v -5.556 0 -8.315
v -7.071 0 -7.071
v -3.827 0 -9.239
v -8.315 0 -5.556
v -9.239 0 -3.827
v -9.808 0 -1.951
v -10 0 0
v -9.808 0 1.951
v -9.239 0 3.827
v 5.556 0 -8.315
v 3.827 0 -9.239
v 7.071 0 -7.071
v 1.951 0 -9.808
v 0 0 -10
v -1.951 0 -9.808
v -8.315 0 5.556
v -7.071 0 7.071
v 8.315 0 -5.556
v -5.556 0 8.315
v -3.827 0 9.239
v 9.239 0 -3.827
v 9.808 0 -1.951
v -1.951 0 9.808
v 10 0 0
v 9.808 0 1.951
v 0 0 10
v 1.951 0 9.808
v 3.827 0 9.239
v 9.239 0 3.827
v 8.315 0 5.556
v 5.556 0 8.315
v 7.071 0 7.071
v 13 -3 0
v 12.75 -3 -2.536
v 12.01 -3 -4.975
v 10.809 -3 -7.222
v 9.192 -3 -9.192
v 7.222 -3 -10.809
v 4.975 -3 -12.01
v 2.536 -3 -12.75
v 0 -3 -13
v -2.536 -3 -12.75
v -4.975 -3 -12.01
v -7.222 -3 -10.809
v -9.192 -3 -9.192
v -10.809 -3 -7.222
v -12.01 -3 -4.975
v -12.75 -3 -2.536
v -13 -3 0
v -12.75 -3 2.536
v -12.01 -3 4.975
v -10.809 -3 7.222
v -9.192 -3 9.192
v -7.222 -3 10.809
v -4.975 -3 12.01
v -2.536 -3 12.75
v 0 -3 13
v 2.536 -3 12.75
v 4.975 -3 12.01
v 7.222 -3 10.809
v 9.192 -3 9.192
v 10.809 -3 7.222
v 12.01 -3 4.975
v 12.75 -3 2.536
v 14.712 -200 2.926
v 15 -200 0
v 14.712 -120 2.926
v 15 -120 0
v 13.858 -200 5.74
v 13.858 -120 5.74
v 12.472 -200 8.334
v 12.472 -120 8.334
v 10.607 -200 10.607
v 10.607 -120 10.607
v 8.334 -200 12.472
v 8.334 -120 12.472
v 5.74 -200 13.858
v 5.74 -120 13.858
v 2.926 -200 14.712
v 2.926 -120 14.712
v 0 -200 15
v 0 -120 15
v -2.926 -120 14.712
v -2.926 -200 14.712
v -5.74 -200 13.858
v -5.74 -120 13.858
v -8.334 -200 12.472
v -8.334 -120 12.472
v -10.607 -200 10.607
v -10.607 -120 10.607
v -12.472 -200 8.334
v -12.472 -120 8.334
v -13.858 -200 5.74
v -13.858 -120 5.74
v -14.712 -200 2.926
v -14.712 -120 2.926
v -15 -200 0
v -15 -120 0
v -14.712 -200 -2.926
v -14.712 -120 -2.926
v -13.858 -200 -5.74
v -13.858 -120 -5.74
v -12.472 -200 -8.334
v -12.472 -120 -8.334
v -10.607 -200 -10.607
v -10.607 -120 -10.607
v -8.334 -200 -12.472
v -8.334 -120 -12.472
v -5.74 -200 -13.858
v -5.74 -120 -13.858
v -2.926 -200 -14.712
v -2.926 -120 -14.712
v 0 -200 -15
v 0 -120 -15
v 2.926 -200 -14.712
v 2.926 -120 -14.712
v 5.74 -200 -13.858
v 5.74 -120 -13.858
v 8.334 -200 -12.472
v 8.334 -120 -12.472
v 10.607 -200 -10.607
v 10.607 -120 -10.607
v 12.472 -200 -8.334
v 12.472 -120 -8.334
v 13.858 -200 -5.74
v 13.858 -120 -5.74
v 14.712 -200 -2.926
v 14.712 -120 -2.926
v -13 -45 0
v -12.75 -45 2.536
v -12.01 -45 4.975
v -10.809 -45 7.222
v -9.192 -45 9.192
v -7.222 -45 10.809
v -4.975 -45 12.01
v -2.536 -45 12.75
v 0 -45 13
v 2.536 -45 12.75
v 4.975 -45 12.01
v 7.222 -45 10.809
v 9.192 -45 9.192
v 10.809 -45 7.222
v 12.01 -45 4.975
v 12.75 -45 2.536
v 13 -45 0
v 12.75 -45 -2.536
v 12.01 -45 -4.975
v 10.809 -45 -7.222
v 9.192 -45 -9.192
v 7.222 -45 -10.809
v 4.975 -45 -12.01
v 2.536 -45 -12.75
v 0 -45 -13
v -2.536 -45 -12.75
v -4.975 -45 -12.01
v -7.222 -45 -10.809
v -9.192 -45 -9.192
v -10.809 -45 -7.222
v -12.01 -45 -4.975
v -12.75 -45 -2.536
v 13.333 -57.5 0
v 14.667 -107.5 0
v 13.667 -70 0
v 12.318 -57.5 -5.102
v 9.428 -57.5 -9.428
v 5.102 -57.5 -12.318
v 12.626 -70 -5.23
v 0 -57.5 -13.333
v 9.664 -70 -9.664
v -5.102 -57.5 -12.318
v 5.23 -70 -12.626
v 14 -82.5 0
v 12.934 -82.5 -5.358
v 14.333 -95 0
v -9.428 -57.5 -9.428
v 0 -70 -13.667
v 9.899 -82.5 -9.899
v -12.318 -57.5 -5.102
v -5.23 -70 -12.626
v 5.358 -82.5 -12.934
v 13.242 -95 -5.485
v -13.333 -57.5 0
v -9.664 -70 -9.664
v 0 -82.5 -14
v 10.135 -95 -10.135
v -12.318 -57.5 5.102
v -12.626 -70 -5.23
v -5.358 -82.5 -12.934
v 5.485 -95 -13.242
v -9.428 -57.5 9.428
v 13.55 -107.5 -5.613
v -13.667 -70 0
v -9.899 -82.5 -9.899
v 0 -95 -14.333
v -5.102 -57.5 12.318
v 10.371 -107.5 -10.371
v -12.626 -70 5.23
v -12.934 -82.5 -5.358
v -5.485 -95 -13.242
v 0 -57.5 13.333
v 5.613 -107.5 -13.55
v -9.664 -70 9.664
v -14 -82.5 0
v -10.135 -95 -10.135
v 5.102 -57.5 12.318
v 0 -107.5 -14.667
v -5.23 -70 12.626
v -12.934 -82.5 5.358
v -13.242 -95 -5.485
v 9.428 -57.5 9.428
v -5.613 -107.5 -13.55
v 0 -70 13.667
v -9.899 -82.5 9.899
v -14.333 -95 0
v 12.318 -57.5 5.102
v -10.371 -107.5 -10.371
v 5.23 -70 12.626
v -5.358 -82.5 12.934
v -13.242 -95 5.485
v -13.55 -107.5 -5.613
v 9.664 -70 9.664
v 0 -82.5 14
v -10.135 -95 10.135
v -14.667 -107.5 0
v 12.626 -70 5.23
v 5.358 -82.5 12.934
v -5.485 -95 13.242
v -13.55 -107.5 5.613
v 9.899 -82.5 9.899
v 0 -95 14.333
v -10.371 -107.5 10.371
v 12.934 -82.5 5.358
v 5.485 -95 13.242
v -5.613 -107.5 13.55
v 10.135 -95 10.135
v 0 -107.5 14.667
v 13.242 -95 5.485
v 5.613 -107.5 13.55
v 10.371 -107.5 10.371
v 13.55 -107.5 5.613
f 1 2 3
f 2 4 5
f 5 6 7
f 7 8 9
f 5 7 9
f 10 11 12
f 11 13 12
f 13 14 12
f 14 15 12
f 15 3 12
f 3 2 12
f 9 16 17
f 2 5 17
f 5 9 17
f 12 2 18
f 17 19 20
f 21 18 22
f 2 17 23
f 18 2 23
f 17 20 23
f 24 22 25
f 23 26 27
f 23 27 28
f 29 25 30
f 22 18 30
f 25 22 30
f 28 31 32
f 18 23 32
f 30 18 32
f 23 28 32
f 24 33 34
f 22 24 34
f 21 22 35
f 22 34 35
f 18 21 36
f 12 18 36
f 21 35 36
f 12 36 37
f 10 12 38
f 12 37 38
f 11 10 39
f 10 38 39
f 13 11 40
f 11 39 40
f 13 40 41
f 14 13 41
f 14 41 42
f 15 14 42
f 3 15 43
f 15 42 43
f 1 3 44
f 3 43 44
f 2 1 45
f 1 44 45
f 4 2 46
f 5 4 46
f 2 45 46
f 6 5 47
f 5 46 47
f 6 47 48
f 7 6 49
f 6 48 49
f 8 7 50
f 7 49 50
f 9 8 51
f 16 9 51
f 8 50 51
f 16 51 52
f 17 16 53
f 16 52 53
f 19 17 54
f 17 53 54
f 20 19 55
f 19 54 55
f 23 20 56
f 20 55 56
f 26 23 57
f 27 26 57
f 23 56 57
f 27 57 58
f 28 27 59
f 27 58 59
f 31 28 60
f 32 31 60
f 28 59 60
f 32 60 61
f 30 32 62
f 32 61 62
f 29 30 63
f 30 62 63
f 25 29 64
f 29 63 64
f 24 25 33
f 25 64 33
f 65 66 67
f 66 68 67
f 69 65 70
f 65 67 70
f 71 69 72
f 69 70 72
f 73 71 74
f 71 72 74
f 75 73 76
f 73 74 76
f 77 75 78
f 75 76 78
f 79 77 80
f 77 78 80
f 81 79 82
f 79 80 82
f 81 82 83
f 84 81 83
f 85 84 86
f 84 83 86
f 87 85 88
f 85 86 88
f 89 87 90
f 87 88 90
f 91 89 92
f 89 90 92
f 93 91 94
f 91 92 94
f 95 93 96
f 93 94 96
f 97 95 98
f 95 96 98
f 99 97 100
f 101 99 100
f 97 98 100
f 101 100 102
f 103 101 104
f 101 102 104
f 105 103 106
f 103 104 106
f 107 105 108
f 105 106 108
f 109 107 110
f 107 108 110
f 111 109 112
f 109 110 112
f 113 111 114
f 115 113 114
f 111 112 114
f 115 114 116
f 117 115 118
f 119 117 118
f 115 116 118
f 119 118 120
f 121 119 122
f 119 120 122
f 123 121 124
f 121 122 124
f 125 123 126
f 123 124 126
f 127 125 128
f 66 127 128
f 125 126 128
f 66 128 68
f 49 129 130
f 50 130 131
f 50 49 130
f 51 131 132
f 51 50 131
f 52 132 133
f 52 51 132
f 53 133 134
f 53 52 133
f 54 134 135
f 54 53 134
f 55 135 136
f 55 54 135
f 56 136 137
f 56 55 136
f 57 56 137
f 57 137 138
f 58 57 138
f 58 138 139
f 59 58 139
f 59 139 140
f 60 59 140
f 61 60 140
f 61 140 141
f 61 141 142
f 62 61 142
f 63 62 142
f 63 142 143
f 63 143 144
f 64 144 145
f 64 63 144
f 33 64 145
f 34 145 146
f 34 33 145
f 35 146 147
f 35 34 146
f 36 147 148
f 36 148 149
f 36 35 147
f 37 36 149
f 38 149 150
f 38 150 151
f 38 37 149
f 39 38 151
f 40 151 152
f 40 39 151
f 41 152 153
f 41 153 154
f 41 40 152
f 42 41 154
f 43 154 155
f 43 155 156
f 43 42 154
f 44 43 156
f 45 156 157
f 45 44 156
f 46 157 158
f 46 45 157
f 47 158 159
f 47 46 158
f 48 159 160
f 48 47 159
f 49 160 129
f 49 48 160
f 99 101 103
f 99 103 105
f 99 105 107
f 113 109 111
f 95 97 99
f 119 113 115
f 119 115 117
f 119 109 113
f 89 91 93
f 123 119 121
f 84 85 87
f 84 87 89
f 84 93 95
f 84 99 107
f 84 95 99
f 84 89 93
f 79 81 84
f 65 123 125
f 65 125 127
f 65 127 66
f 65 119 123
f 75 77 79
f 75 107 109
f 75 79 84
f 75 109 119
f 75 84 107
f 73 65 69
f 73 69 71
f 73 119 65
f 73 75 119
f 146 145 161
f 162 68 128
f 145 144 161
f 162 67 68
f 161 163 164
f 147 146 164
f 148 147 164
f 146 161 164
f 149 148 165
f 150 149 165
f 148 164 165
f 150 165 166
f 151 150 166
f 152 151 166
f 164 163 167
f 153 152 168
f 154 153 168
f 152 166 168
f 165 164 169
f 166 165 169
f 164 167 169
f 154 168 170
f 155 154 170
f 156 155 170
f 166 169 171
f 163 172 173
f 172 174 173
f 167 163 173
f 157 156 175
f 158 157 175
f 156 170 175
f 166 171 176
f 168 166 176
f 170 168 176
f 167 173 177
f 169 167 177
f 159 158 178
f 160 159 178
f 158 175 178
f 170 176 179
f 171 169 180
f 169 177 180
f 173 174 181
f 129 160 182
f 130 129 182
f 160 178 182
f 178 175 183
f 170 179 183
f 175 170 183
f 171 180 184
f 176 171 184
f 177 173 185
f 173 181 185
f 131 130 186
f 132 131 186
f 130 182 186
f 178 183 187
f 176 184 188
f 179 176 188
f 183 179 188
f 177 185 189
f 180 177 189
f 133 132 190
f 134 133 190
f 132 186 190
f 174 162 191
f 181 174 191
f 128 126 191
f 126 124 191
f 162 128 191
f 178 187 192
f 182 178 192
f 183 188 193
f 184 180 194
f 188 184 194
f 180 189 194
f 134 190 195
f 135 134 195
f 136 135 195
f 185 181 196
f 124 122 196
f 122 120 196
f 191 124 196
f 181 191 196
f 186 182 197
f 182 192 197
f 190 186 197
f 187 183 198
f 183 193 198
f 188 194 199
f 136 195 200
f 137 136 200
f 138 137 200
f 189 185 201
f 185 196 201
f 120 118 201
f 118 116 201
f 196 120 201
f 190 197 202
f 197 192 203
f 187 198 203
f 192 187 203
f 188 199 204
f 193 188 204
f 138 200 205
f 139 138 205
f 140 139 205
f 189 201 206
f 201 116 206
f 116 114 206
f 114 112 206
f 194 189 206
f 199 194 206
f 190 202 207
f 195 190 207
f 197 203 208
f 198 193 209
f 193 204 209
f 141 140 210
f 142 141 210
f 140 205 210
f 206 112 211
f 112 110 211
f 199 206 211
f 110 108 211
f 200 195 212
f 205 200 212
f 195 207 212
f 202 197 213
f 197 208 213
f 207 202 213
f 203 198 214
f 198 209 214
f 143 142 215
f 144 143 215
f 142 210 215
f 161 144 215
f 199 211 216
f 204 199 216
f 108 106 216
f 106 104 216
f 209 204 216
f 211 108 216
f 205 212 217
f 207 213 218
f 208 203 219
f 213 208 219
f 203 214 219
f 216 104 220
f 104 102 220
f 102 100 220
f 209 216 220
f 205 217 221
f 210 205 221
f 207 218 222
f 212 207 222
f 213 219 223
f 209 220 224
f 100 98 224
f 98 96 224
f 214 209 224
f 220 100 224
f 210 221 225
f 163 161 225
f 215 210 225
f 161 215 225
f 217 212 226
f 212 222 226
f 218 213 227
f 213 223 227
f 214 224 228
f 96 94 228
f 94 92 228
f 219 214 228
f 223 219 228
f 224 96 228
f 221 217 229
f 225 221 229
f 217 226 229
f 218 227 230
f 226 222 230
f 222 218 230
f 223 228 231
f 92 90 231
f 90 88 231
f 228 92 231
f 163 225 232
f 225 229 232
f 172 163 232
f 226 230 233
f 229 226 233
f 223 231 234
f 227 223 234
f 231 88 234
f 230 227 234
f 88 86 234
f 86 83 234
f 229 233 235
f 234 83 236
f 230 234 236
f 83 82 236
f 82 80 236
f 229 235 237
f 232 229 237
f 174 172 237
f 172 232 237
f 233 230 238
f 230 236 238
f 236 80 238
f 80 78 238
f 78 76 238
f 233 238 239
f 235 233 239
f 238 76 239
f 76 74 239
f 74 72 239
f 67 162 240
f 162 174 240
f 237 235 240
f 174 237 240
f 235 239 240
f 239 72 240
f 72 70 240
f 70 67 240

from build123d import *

# Parameters (mm, degrees)
F0_R     = 15
F1_DEPTH = 150
F2_R     = 15
F2_R_2   = 13
F3_DEPTH = 45
F6_R     = 15
F7_DEPTH = 50


with BuildPart() as f1:
    # F0 (on Front) → F1 (new body)
    with BuildSketch(Plane.XZ):
        Circle(F0_R)
    extrude(amount=F1_DEPTH)

    # F2 (on face) → F3 (cut)
    with BuildSketch(Plane(origin=(0, 0, 0), x_dir=(-1, 0, 0), z_dir=(0, 1, 0))):
        Circle(F2_R)
        Circle(F2_R_2, mode=Mode.SUBTRACT)
    extrude(amount=-F3_DEPTH, mode=Mode.SUBTRACT)

    # F4 (on Top) → F5 (revolve, cut)
    with BuildSketch(Plane.XY):
        Polygon((15, -45), (13, -45), (15, -120), align=None)
        Polygon((13, 0), (10, 0), (13, -3), align=None)
    revolve(axis=Axis((0, 0, 0), (0, 1, 0)), mode=Mode.SUBTRACT)

    # F6 (on face) → F7 (join)
    with BuildSketch(Plane.XZ.offset(150)):
        Circle(F6_R)
    extrude(amount=F7_DEPTH)


solid = f1.part
